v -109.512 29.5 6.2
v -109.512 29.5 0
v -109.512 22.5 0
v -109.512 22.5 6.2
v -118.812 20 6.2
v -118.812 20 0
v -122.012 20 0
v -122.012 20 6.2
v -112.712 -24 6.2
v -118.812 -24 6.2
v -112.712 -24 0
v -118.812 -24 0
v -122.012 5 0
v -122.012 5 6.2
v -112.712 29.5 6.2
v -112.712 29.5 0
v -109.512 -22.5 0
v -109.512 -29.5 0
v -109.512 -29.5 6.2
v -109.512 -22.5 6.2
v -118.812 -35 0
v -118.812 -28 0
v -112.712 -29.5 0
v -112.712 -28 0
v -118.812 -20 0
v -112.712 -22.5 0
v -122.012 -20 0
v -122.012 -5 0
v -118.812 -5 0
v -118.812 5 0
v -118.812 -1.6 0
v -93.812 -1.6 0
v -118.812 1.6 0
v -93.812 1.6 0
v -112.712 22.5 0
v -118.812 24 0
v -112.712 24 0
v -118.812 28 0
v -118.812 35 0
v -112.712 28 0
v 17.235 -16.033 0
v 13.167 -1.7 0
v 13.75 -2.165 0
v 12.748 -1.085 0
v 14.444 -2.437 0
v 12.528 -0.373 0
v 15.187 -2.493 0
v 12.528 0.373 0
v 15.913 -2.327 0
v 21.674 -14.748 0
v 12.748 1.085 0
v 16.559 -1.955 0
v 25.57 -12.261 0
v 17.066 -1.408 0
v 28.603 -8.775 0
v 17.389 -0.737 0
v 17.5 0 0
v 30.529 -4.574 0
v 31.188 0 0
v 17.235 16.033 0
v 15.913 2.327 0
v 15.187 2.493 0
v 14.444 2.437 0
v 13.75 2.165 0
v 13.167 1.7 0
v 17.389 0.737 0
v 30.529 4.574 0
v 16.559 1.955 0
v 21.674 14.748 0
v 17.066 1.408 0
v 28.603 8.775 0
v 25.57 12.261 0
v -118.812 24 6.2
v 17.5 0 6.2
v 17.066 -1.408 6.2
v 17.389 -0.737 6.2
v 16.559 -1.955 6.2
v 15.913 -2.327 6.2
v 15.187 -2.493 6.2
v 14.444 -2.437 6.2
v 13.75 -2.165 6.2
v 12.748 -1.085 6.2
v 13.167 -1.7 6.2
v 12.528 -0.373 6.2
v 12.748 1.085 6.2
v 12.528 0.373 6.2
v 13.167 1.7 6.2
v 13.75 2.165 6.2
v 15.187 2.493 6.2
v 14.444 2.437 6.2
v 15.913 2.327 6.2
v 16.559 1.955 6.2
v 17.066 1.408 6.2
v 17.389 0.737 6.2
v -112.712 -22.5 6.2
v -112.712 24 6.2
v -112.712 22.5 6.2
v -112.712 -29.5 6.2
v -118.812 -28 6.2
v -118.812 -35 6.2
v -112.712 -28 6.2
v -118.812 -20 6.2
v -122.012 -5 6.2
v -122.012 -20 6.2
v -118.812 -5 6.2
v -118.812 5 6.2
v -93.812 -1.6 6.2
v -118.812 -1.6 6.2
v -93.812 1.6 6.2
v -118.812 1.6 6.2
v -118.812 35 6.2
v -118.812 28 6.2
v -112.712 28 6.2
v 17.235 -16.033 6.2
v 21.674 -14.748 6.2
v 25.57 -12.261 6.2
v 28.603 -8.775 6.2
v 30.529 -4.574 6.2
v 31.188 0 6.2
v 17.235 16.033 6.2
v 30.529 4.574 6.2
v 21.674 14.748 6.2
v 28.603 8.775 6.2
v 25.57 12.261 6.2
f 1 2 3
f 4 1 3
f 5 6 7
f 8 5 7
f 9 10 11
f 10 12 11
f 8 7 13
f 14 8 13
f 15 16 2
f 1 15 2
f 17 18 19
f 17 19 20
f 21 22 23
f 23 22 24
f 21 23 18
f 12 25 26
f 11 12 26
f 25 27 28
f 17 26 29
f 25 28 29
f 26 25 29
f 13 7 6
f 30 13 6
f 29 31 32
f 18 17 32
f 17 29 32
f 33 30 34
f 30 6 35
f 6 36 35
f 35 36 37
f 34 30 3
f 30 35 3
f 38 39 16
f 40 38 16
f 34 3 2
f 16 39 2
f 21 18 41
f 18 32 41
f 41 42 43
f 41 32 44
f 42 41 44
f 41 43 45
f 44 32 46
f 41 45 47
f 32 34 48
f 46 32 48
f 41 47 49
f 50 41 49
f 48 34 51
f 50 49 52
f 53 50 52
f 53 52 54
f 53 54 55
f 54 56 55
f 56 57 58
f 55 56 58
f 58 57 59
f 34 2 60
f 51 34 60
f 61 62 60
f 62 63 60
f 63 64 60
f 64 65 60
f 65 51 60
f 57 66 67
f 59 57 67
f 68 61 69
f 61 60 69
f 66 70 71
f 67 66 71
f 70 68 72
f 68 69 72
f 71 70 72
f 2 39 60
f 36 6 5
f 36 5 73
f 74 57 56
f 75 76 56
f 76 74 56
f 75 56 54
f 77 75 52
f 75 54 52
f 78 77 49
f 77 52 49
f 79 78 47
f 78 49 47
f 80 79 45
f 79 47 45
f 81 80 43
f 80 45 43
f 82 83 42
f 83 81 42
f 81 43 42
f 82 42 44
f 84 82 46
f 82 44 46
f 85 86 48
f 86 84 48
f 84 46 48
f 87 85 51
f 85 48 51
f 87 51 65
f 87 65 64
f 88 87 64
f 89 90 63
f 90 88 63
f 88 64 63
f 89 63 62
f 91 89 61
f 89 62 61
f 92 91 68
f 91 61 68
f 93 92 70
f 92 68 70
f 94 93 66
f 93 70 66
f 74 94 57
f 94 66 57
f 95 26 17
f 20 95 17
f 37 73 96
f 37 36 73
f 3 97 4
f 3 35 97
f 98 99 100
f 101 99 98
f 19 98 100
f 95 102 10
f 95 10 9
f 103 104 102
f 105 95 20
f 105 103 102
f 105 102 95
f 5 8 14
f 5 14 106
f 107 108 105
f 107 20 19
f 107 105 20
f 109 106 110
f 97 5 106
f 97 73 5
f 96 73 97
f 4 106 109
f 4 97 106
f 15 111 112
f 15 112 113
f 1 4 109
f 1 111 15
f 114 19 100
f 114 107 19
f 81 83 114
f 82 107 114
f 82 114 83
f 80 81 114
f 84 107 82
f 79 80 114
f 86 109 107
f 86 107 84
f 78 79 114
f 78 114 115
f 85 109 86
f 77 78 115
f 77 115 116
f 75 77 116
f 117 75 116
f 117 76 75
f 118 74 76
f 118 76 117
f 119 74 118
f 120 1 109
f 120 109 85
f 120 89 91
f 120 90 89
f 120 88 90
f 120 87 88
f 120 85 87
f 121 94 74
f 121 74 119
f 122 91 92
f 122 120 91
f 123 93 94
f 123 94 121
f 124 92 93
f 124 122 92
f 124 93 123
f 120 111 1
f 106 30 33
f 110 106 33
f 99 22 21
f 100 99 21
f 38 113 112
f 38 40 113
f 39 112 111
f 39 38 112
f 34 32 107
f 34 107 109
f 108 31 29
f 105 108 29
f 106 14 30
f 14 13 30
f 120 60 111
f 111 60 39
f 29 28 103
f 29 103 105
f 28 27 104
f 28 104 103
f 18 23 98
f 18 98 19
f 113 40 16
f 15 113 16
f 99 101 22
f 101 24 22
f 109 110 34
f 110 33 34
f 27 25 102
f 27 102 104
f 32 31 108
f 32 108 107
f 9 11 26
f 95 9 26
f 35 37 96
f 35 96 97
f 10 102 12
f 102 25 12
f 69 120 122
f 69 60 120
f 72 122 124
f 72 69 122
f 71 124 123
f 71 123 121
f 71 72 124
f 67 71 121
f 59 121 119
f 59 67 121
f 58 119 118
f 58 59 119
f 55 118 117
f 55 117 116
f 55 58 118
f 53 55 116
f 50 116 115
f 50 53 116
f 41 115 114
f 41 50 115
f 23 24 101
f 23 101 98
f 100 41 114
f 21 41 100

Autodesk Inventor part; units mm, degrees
ref_plane "YZ Plane" through (0, 0, 0) normal (1, 0, 0) x (0, 1, 0)
ref_plane "XZ Plane" through (0, 0, 0) normal (0, 1, 0) x (-1, 0, 0)
ref_plane "XY Plane" through (0, 0, 0) normal (0, 0, 1) x (1, 0, 0)
sketch "Sketch2" plane through (0, 0, 0) normal (0, 0, 1) x (1, 0, 0)
  arc A0 (9.9386, -9.7664) -> (20.0614, -9.7664) centre (15, 0) ccw
  arc A1 (20.9272, -9.2665) -> (25.9886, -0.4999) centre (15, 0) ccw
  arc A2 (25.9886, 0.4999) -> (20.9272, 9.2665) centre (15, 0) ccw
  arc A3 (20.0614, 9.7664) -> (9.9386, 9.7664) centre (15, 0) ccw
  arc A4 (9.0728, 9.2665) -> (4.0114, 0.4999) centre (15, 0) ccw
  arc A5 (4.0114, -0.4999) -> (9.0728, -9.2665) centre (15, 0) ccw
  circle A6 centre (15, 0) radius 2.5
  arc A7 (0, -3) -> (12, -15) centre (12, -3) ccw
  circle A8 centre (15, 0) radius 16.1883
  line L0 (31.1883, 0) -> (-118.8117, 0) construction
  line L1 (-118.8117, 0) -> (-118.8117, 35)
  line L2 (17.2352, 16.0332) -> (-118.8117, 35)
  line L3 (-118.8117, 0) -> (-118.8117, -35)
  line L4 (17.2352, -16.0332) -> (-118.8117, -35)
  line L5 (-118.8117, -20) -> (-122.0117, -20)
  line L6 (-122.0117, -20) -> (-122.0117, -5)
  line L7 (-122.0117, -5) -> (-118.8117, -5)
  line L8 (-118.8117, 20) -> (-122.0117, 20)
  line L9 (-122.0117, 20) -> (-122.0117, 5)
  line L10 (-122.0117, 5) -> (-118.8117, 5)
  line L11 (-118.8117, 0) -> (-118.8117, 1.6)
  line L12 (-118.8117, 1.6) -> (-93.8117, 1.6)
  line L13 (-118.8117, 0) -> (-118.8117, -1.6)
  line L14 (-118.8117, -1.6) -> (-93.8117, -1.6)
  line L15 (-93.8117, -1.6) -> (-93.8117, 1.6)
  point P0 (0, 0)
  point P1 (5.2336, -12.9104)
  point P2 (2.0896, -9.7664)
  point P3 (-118.8117, 5)
  point P4 (-118.8117, 20)
extrude "Extrusion1" add sketch "Sketch2" along normal blind 6.2
sketch "Sketch4" plane through (0, 0, 0) normal (0, 0, -1) x (-1, 0, 0)
  line L0 (93.8117, -1.6) -> (93.8117, 1.6) projected
  line L1 (118.8117, 1.6) -> (93.8117, 1.6) projected
  line L2 (118.8117, -1.6) -> (93.8117, -1.6) projected
  line L3 (118.8117, 5) -> (118.8117, -5) projected
  line L4 (118.8117, 0) -> (118.8117, -35) projected
  point P0 (0, 0)
extrude "Extrusion2" cut sketch "Sketch4" against normal blind 10
sketch "Sketch5" plane through (0, 0, 0) normal (0, 0, -1) x (-1, 0, 0)
  line L0 (118.8117, -111.6) -> (118.8117, 288.4) projected
  line L1 (118.8117, -20) -> (118.8117, -35) projected
  line L2 (118.8117, -24) -> (112.7117, -24)
  line L3 (112.7117, -24) -> (112.7117, -28)
  line L4 (112.7117, -28) -> (118.8117, -28)
  line L5 (118.8117, -28) -> (118.8117, -24)
  line L6 (112.7117, -26) -> (112.7117, -22.5)
  line L7 (112.7117, -22.5) -> (109.5117, -22.5)
  line L8 (112.7117, -26) -> (114.7394, -26) construction
  line L9 (112.7117, -26) -> (112.7117, -29.5)
  line L10 (112.7117, -29.5) -> (109.5117, -29.5)
  line L11 (109.5117, -29.5) -> (109.5117, -22.5)
  line L12 (93.8117, -1.6) -> (93.8117, 1.6) projected
  line L13 (93.8117, 0) -> (109.9488, 0) construction
  line L14 (118.8117, 111.6) -> (118.8117, -288.4)
  line L15 (118.8117, 20) -> (118.8117, 35)
  line L16 (118.8117, 24) -> (112.7117, 24)
  line L17 (112.7117, 28) -> (118.8117, 28)
  line L18 (112.7117, 26) -> (112.7117, 22.5)
  line L19 (112.7117, 22.5) -> (109.5117, 22.5)
  line L20 (112.7117, 26) -> (112.7117, 29.5)
  line L21 (112.7117, 29.5) -> (109.5117, 29.5)
  line L22 (109.5117, 29.5) -> (109.5117, 22.5)
  point P0 (0, 0)
  point P1 (112.7117, 24)
  point P2 (112.7117, -24)
  dimension "d14" = 6.1
  dimension "d15" = 4
  dimension "d16" = 7
  dimension "d17" = 3.5
  dimension "d18" = 3.2
extrude "Extrusion3" cut sketch "Sketch5" against normal blind 6.2
properties part number "Base"
